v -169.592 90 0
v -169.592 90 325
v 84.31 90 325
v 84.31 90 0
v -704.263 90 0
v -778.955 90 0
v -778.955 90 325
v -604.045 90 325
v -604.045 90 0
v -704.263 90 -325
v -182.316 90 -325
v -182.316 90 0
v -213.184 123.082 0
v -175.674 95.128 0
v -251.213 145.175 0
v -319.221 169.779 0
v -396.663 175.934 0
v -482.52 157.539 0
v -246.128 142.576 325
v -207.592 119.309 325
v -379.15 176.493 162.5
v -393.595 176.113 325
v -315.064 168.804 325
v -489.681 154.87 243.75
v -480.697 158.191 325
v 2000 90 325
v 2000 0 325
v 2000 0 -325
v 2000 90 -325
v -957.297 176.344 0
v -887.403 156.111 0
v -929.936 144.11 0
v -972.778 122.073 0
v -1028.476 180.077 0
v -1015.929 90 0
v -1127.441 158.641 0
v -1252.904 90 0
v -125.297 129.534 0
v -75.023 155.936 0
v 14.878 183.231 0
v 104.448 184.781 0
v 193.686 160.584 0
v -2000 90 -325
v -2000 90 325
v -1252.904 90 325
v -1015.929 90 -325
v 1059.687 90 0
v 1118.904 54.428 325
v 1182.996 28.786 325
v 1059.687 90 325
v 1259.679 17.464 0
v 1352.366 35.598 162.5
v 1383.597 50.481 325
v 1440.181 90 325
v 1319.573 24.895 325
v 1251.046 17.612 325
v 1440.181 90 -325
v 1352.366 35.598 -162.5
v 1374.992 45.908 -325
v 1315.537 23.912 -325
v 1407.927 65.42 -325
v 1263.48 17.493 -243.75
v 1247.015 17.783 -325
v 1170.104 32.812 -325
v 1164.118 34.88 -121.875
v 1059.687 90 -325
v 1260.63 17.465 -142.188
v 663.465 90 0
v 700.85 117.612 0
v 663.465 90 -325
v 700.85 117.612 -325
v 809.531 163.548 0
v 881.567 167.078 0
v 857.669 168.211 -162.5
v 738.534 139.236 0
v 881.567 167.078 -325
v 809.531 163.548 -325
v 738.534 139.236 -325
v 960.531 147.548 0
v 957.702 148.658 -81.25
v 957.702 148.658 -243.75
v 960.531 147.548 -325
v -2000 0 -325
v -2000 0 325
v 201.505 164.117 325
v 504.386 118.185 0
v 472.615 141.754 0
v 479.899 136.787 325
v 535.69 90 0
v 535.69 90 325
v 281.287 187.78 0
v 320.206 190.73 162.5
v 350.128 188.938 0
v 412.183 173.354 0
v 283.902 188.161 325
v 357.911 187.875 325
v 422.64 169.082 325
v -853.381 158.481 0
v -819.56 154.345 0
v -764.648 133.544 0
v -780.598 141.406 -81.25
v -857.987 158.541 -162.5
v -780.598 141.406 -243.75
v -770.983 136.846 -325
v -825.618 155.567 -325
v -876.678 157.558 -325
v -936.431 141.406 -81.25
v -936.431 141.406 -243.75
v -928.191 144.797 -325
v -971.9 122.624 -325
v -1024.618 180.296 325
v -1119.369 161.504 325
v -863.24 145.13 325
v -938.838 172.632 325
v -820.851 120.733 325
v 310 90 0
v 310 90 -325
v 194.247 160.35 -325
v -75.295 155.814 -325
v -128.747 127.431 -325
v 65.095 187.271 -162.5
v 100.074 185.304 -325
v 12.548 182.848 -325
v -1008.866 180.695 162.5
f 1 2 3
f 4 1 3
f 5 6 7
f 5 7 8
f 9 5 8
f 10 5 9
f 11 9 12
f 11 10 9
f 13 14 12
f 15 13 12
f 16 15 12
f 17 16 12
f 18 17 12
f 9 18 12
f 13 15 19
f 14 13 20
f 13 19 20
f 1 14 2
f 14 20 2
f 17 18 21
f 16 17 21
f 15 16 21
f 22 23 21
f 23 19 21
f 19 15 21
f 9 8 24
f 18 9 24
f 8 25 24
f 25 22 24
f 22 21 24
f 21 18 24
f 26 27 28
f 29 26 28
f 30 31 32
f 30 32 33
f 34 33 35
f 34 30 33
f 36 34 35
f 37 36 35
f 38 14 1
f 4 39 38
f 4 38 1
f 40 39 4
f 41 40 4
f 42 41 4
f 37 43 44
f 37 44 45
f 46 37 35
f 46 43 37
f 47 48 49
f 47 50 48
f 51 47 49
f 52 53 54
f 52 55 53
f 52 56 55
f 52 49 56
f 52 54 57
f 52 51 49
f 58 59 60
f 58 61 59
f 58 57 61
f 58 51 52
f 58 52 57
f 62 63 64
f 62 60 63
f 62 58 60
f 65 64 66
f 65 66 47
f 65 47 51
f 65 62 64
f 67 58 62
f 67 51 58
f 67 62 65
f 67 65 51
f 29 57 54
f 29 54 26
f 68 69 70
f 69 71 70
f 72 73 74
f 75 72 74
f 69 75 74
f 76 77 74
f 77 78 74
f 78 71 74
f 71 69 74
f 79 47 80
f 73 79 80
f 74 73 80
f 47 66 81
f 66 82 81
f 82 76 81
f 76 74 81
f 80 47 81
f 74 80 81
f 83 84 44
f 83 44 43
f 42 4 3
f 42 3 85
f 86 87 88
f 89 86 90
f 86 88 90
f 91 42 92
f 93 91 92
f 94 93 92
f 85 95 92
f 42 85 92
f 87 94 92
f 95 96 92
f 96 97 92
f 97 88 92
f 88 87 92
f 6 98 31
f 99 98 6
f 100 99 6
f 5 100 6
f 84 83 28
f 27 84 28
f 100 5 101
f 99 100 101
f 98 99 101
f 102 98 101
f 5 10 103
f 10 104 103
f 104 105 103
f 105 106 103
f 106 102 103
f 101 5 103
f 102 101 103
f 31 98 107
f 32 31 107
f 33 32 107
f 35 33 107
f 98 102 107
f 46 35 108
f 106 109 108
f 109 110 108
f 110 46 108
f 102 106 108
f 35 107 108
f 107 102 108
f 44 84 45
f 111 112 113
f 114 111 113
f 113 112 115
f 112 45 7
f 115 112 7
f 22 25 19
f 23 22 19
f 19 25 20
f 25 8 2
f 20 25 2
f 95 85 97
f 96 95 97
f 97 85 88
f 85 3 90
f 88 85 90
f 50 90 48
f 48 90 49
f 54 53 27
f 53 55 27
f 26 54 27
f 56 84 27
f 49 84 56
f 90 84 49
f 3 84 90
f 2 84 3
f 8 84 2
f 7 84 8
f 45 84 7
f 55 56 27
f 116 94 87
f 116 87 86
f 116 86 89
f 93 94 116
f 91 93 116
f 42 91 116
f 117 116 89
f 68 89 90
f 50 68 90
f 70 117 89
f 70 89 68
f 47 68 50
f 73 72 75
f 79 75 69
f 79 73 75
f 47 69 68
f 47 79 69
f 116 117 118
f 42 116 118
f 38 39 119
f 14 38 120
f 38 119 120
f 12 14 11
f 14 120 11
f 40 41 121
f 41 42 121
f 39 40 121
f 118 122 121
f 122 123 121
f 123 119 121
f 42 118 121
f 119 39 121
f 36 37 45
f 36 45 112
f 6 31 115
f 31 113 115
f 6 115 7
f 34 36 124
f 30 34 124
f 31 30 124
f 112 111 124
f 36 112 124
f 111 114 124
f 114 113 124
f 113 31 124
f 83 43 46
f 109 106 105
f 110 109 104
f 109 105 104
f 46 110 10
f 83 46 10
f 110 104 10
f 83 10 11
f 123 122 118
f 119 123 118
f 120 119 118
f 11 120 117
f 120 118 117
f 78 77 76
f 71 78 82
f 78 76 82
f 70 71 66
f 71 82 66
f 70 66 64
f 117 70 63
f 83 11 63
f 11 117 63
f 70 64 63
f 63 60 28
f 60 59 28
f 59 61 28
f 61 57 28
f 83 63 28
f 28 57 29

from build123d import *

# Parameters (mm, degrees)
SKETCH1_W           = 4000
SKETCH1_H           = 650
BOSS_EXTRUDE1_DEPTH = 90
BOSS_EXTRUDE2_DEPTH = 325
BOSS_EXTRUDE3_DEPTH = 325
CUT_EXTRUDE1_DEPTH  = 1100


with BuildPart() as part:
    # Sketch1 → Boss-Extrude1 (new body)
    with BuildSketch(Plane(origin=(0, 0, 0), x_dir=(1, 0, 0), z_dir=(0, 1, 0))):
        Rectangle(SKETCH1_W, SKETCH1_H)
    extrude(amount=BOSS_EXTRUDE1_DEPTH)

    # Sketch2 → Boss-Extrude2 (add)
    with BuildSketch(Plane.XY.offset(325)):
        with BuildLine():
            add(Edge.make_bspline(
                [(-1252.903831596, 90), (-1001.803278646, 271.390478837), (-778.954757525, 90)],
                knots=[0, 0, 0, 1, 1, 1], degree=2))
            Line((-1252.903831596, 90), (-778.954757525, 90))
        make_face()
        with BuildLine():
            add(Edge.make_bspline(
                [(-604.044980189, 90), (-371.48235813, 262.986446505), (-169.59166229, 90)],
                knots=[0, 0, 0, 1, 1, 1], degree=2))
            Line((-604.044980189, 90), (-169.59166229, 90))
        make_face()
        with BuildLine():
            add(Edge.make_bspline(
                [(84.309627392, 90), (330.413191865, 291.459655472), (535.689697936, 90)],
                knots=[0, 0, 0, 1, 1, 1], degree=2))
            Line((84.309627392, 90), (535.689697936, 90))
        make_face()
    extrude(amount=-BOSS_EXTRUDE2_DEPTH)

    # Sketch3 → Boss-Extrude3 (add)
    with BuildSketch(Plane(origin=(0, 0, -325), x_dir=(-1, 0, 0), z_dir=(0, 0, -1))):
        with BuildLine():
            add(Edge.make_bspline(
                [(-1059.6871877, 90), (-853.762409996, 246.421021522), (-663.465166324, 90)],
                knots=[0, 0, 0, 1, 1, 1], degree=2))
            Line((-1059.6871877, 90), (-663.465166324, 90))
        make_face()
        with BuildLine():
            add(Edge.make_bspline(
                [(-309.999662664, 90), (-66.34747312, 284.541836271), (182.316456228, 90)],
                knots=[0, 0, 0, 1, 1, 1], degree=2))
            Line((-309.999662664, 90), (182.316456228, 90))
        make_face()
        with BuildLine():
            add(Edge.make_bspline(
                [(704.262772848, 90), (855.878816097, 227.081429679), (1015.92929456, 90)],
                knots=[0, 0, 0, 1, 1, 1], degree=2))
            Line((704.262772848, 90), (1015.92929456, 90))
        make_face()
    extrude(amount=-BOSS_EXTRUDE3_DEPTH)

    # Sketch4 → Cut-Extrude1 (cut)
    with BuildSketch(Plane(origin=(0, 0, -325), x_dir=(-1, 0, 0), z_dir=(0, 0, -1))):
        with BuildLine():
            Line((-1440.181007099, 90), (-1059.6871877, 90))
            add(Edge.make_bspline(
                [(-1059.6871877, 90), (-1269.424201865, -55.072631601), (-1440.181007099, 90)],
                knots=[0, 0, 0, 1, 1, 1], degree=2))
        make_face()
    extrude(amount=-CUT_EXTRUDE1_DEPTH, mode=Mode.SUBTRACT)


solid = part.part
